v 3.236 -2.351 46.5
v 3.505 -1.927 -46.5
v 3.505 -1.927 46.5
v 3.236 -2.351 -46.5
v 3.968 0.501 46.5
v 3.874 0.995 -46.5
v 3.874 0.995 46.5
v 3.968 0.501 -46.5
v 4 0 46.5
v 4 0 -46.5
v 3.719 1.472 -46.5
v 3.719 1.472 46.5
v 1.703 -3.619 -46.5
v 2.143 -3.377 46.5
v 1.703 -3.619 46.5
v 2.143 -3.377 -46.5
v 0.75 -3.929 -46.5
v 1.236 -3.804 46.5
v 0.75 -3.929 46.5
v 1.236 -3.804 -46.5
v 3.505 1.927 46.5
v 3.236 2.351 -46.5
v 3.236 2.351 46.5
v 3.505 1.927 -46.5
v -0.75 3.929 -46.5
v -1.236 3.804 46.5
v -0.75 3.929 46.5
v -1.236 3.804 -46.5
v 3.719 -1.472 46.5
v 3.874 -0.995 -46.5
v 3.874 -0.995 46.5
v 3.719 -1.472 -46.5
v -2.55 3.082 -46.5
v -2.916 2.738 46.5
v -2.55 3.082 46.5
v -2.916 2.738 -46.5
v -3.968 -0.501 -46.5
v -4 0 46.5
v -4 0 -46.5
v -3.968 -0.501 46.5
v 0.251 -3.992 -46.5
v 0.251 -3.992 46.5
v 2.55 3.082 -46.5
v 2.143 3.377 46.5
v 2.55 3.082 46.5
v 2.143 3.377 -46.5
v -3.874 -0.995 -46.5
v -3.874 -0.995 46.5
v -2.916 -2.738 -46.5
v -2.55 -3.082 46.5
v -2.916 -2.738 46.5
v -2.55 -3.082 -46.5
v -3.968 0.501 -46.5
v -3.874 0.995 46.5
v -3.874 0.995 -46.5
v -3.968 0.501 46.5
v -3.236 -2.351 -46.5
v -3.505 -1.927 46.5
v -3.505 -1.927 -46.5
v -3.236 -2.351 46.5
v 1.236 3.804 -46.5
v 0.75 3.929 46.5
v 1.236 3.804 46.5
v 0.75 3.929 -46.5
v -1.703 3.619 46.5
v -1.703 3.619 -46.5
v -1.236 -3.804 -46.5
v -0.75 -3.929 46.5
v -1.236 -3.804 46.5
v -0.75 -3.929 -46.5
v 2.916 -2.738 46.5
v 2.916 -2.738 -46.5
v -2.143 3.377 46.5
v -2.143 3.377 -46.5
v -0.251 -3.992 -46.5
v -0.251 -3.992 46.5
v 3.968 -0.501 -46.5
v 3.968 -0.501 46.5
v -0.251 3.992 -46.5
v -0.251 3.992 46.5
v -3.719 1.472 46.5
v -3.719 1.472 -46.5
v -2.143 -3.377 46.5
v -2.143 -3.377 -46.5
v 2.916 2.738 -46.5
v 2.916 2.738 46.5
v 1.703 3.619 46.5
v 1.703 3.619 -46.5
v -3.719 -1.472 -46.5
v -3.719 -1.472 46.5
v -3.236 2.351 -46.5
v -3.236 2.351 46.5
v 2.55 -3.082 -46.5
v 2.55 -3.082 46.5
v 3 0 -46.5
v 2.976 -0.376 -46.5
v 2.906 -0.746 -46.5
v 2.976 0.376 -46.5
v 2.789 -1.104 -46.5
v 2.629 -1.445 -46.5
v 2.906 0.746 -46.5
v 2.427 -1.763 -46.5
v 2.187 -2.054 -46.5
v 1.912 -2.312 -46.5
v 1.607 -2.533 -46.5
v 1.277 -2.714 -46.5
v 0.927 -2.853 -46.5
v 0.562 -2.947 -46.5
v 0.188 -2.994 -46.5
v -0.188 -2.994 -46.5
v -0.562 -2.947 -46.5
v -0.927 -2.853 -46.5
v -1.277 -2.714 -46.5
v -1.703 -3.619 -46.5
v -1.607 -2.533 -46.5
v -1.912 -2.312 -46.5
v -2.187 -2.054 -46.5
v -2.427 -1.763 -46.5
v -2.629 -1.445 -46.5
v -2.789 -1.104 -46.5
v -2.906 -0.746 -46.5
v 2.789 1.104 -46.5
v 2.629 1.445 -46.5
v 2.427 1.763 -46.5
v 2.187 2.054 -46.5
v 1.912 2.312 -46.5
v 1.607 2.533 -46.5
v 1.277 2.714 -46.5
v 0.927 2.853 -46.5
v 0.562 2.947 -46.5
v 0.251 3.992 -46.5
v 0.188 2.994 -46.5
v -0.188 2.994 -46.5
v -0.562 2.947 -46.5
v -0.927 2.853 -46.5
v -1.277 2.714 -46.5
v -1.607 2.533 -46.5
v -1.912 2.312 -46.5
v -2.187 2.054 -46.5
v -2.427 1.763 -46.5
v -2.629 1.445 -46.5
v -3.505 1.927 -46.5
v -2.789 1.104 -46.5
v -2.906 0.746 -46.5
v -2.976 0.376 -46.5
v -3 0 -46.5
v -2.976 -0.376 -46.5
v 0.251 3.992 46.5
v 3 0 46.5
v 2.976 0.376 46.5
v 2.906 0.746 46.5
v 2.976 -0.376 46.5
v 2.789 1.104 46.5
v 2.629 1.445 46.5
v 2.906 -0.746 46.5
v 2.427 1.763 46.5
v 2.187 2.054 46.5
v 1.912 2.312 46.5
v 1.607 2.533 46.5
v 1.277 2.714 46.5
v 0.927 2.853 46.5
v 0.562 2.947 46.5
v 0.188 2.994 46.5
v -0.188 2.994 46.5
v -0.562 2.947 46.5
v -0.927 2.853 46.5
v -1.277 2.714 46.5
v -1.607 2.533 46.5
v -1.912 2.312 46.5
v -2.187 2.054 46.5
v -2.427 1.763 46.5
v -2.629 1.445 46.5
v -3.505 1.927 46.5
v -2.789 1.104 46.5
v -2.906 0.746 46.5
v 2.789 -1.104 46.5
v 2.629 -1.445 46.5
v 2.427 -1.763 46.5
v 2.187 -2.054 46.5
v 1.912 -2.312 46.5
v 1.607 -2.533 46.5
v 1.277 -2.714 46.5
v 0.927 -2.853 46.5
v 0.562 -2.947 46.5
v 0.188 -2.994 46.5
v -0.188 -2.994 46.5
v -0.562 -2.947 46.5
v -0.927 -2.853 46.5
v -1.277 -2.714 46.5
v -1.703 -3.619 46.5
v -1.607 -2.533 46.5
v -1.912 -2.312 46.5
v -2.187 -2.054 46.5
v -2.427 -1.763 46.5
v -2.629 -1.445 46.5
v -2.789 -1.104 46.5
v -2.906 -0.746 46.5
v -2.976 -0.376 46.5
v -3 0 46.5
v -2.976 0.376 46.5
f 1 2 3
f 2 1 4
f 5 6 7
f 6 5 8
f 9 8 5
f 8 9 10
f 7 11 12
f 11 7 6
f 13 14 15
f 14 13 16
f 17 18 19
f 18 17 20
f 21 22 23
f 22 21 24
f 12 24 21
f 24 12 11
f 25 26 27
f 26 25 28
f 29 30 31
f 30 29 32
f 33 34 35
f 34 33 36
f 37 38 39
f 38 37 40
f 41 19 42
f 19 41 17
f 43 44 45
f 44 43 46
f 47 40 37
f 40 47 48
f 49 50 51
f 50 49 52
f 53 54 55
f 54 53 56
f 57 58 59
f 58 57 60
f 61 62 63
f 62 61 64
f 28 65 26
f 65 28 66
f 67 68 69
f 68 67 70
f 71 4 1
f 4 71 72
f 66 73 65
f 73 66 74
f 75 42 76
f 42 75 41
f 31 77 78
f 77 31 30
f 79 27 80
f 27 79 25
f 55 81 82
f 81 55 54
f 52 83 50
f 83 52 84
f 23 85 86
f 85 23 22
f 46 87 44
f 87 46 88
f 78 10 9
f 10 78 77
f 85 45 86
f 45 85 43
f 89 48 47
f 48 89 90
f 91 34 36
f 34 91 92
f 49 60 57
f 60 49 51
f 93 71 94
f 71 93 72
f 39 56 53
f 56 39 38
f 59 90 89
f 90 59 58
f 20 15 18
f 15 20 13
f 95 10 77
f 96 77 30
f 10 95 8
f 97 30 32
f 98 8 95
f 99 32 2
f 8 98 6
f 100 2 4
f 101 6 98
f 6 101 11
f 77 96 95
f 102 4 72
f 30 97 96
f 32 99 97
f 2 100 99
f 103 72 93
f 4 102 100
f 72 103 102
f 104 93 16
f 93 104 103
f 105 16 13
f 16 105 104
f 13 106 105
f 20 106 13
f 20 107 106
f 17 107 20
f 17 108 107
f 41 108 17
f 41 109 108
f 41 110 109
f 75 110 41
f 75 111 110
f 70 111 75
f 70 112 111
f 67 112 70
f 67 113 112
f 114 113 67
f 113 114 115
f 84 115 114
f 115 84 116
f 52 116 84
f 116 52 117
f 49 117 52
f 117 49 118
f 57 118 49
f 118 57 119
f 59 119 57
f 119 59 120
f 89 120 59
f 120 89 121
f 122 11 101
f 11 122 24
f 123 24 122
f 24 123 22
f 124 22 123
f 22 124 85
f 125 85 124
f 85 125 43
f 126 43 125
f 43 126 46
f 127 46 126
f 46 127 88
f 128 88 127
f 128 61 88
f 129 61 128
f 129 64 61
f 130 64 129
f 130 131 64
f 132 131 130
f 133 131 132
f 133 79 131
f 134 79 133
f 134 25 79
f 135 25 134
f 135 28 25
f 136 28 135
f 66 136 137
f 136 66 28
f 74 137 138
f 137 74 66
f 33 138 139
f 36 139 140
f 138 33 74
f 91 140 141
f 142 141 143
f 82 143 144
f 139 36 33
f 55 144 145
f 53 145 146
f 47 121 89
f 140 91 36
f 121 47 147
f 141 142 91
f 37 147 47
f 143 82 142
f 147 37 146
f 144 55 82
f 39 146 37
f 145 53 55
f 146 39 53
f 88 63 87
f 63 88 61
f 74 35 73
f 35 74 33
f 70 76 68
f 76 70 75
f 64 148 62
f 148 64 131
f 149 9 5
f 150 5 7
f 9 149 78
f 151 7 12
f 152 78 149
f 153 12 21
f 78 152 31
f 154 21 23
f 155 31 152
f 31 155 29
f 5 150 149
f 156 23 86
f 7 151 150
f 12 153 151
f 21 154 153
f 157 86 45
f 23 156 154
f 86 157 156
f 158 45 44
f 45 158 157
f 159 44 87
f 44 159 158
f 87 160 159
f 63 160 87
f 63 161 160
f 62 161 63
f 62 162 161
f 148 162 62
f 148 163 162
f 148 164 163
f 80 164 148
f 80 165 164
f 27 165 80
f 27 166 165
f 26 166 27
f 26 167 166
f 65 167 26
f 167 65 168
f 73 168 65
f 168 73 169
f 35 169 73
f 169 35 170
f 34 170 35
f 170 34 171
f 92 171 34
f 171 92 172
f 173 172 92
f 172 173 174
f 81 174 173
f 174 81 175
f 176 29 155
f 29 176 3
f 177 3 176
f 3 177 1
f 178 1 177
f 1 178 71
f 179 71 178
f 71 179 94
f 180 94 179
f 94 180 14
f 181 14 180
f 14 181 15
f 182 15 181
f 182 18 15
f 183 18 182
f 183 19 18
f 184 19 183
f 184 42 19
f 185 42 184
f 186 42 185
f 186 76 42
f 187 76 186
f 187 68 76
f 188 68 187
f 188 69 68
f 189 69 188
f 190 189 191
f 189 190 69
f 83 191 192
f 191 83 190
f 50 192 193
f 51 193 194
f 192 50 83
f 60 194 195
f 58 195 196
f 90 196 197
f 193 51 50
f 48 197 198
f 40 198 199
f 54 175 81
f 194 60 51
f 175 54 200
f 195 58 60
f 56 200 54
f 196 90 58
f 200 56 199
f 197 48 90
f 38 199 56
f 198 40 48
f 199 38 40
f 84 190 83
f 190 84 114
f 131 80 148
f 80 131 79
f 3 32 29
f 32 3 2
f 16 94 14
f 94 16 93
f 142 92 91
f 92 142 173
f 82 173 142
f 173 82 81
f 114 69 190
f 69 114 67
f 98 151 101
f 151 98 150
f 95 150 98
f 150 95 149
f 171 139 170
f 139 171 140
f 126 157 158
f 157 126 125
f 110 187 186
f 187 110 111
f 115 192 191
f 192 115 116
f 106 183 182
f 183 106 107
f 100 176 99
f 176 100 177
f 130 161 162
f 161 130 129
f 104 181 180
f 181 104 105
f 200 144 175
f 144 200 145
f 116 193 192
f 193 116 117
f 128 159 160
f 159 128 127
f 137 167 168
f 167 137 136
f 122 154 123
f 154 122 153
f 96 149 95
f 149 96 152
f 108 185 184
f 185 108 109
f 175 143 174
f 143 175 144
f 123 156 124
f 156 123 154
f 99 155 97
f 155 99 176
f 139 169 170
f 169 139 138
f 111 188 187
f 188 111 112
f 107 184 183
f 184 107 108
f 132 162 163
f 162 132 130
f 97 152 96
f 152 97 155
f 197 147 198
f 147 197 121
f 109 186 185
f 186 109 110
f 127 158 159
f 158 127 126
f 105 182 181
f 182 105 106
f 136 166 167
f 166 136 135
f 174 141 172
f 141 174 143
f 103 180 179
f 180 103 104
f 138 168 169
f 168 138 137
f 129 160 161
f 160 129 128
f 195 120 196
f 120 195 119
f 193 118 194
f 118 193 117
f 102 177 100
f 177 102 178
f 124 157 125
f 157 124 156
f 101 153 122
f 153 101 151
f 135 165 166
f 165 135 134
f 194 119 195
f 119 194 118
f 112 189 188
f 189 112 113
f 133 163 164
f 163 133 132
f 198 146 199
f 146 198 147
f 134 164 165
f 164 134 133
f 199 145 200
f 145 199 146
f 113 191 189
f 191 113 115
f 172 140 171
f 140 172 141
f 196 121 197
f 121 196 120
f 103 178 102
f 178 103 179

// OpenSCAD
$fn = 50;


difference() {
	union() {
		translate(v = [0, 0, -46.5000000000]) {
			cylinder(h = 93, r = 4.0000000000);
		}
	}
	union() {
		translate(v = [0, 0, -100.0000000000]) {
			cylinder(h = 200, r = 3.0000000000);
		}
	}
}
